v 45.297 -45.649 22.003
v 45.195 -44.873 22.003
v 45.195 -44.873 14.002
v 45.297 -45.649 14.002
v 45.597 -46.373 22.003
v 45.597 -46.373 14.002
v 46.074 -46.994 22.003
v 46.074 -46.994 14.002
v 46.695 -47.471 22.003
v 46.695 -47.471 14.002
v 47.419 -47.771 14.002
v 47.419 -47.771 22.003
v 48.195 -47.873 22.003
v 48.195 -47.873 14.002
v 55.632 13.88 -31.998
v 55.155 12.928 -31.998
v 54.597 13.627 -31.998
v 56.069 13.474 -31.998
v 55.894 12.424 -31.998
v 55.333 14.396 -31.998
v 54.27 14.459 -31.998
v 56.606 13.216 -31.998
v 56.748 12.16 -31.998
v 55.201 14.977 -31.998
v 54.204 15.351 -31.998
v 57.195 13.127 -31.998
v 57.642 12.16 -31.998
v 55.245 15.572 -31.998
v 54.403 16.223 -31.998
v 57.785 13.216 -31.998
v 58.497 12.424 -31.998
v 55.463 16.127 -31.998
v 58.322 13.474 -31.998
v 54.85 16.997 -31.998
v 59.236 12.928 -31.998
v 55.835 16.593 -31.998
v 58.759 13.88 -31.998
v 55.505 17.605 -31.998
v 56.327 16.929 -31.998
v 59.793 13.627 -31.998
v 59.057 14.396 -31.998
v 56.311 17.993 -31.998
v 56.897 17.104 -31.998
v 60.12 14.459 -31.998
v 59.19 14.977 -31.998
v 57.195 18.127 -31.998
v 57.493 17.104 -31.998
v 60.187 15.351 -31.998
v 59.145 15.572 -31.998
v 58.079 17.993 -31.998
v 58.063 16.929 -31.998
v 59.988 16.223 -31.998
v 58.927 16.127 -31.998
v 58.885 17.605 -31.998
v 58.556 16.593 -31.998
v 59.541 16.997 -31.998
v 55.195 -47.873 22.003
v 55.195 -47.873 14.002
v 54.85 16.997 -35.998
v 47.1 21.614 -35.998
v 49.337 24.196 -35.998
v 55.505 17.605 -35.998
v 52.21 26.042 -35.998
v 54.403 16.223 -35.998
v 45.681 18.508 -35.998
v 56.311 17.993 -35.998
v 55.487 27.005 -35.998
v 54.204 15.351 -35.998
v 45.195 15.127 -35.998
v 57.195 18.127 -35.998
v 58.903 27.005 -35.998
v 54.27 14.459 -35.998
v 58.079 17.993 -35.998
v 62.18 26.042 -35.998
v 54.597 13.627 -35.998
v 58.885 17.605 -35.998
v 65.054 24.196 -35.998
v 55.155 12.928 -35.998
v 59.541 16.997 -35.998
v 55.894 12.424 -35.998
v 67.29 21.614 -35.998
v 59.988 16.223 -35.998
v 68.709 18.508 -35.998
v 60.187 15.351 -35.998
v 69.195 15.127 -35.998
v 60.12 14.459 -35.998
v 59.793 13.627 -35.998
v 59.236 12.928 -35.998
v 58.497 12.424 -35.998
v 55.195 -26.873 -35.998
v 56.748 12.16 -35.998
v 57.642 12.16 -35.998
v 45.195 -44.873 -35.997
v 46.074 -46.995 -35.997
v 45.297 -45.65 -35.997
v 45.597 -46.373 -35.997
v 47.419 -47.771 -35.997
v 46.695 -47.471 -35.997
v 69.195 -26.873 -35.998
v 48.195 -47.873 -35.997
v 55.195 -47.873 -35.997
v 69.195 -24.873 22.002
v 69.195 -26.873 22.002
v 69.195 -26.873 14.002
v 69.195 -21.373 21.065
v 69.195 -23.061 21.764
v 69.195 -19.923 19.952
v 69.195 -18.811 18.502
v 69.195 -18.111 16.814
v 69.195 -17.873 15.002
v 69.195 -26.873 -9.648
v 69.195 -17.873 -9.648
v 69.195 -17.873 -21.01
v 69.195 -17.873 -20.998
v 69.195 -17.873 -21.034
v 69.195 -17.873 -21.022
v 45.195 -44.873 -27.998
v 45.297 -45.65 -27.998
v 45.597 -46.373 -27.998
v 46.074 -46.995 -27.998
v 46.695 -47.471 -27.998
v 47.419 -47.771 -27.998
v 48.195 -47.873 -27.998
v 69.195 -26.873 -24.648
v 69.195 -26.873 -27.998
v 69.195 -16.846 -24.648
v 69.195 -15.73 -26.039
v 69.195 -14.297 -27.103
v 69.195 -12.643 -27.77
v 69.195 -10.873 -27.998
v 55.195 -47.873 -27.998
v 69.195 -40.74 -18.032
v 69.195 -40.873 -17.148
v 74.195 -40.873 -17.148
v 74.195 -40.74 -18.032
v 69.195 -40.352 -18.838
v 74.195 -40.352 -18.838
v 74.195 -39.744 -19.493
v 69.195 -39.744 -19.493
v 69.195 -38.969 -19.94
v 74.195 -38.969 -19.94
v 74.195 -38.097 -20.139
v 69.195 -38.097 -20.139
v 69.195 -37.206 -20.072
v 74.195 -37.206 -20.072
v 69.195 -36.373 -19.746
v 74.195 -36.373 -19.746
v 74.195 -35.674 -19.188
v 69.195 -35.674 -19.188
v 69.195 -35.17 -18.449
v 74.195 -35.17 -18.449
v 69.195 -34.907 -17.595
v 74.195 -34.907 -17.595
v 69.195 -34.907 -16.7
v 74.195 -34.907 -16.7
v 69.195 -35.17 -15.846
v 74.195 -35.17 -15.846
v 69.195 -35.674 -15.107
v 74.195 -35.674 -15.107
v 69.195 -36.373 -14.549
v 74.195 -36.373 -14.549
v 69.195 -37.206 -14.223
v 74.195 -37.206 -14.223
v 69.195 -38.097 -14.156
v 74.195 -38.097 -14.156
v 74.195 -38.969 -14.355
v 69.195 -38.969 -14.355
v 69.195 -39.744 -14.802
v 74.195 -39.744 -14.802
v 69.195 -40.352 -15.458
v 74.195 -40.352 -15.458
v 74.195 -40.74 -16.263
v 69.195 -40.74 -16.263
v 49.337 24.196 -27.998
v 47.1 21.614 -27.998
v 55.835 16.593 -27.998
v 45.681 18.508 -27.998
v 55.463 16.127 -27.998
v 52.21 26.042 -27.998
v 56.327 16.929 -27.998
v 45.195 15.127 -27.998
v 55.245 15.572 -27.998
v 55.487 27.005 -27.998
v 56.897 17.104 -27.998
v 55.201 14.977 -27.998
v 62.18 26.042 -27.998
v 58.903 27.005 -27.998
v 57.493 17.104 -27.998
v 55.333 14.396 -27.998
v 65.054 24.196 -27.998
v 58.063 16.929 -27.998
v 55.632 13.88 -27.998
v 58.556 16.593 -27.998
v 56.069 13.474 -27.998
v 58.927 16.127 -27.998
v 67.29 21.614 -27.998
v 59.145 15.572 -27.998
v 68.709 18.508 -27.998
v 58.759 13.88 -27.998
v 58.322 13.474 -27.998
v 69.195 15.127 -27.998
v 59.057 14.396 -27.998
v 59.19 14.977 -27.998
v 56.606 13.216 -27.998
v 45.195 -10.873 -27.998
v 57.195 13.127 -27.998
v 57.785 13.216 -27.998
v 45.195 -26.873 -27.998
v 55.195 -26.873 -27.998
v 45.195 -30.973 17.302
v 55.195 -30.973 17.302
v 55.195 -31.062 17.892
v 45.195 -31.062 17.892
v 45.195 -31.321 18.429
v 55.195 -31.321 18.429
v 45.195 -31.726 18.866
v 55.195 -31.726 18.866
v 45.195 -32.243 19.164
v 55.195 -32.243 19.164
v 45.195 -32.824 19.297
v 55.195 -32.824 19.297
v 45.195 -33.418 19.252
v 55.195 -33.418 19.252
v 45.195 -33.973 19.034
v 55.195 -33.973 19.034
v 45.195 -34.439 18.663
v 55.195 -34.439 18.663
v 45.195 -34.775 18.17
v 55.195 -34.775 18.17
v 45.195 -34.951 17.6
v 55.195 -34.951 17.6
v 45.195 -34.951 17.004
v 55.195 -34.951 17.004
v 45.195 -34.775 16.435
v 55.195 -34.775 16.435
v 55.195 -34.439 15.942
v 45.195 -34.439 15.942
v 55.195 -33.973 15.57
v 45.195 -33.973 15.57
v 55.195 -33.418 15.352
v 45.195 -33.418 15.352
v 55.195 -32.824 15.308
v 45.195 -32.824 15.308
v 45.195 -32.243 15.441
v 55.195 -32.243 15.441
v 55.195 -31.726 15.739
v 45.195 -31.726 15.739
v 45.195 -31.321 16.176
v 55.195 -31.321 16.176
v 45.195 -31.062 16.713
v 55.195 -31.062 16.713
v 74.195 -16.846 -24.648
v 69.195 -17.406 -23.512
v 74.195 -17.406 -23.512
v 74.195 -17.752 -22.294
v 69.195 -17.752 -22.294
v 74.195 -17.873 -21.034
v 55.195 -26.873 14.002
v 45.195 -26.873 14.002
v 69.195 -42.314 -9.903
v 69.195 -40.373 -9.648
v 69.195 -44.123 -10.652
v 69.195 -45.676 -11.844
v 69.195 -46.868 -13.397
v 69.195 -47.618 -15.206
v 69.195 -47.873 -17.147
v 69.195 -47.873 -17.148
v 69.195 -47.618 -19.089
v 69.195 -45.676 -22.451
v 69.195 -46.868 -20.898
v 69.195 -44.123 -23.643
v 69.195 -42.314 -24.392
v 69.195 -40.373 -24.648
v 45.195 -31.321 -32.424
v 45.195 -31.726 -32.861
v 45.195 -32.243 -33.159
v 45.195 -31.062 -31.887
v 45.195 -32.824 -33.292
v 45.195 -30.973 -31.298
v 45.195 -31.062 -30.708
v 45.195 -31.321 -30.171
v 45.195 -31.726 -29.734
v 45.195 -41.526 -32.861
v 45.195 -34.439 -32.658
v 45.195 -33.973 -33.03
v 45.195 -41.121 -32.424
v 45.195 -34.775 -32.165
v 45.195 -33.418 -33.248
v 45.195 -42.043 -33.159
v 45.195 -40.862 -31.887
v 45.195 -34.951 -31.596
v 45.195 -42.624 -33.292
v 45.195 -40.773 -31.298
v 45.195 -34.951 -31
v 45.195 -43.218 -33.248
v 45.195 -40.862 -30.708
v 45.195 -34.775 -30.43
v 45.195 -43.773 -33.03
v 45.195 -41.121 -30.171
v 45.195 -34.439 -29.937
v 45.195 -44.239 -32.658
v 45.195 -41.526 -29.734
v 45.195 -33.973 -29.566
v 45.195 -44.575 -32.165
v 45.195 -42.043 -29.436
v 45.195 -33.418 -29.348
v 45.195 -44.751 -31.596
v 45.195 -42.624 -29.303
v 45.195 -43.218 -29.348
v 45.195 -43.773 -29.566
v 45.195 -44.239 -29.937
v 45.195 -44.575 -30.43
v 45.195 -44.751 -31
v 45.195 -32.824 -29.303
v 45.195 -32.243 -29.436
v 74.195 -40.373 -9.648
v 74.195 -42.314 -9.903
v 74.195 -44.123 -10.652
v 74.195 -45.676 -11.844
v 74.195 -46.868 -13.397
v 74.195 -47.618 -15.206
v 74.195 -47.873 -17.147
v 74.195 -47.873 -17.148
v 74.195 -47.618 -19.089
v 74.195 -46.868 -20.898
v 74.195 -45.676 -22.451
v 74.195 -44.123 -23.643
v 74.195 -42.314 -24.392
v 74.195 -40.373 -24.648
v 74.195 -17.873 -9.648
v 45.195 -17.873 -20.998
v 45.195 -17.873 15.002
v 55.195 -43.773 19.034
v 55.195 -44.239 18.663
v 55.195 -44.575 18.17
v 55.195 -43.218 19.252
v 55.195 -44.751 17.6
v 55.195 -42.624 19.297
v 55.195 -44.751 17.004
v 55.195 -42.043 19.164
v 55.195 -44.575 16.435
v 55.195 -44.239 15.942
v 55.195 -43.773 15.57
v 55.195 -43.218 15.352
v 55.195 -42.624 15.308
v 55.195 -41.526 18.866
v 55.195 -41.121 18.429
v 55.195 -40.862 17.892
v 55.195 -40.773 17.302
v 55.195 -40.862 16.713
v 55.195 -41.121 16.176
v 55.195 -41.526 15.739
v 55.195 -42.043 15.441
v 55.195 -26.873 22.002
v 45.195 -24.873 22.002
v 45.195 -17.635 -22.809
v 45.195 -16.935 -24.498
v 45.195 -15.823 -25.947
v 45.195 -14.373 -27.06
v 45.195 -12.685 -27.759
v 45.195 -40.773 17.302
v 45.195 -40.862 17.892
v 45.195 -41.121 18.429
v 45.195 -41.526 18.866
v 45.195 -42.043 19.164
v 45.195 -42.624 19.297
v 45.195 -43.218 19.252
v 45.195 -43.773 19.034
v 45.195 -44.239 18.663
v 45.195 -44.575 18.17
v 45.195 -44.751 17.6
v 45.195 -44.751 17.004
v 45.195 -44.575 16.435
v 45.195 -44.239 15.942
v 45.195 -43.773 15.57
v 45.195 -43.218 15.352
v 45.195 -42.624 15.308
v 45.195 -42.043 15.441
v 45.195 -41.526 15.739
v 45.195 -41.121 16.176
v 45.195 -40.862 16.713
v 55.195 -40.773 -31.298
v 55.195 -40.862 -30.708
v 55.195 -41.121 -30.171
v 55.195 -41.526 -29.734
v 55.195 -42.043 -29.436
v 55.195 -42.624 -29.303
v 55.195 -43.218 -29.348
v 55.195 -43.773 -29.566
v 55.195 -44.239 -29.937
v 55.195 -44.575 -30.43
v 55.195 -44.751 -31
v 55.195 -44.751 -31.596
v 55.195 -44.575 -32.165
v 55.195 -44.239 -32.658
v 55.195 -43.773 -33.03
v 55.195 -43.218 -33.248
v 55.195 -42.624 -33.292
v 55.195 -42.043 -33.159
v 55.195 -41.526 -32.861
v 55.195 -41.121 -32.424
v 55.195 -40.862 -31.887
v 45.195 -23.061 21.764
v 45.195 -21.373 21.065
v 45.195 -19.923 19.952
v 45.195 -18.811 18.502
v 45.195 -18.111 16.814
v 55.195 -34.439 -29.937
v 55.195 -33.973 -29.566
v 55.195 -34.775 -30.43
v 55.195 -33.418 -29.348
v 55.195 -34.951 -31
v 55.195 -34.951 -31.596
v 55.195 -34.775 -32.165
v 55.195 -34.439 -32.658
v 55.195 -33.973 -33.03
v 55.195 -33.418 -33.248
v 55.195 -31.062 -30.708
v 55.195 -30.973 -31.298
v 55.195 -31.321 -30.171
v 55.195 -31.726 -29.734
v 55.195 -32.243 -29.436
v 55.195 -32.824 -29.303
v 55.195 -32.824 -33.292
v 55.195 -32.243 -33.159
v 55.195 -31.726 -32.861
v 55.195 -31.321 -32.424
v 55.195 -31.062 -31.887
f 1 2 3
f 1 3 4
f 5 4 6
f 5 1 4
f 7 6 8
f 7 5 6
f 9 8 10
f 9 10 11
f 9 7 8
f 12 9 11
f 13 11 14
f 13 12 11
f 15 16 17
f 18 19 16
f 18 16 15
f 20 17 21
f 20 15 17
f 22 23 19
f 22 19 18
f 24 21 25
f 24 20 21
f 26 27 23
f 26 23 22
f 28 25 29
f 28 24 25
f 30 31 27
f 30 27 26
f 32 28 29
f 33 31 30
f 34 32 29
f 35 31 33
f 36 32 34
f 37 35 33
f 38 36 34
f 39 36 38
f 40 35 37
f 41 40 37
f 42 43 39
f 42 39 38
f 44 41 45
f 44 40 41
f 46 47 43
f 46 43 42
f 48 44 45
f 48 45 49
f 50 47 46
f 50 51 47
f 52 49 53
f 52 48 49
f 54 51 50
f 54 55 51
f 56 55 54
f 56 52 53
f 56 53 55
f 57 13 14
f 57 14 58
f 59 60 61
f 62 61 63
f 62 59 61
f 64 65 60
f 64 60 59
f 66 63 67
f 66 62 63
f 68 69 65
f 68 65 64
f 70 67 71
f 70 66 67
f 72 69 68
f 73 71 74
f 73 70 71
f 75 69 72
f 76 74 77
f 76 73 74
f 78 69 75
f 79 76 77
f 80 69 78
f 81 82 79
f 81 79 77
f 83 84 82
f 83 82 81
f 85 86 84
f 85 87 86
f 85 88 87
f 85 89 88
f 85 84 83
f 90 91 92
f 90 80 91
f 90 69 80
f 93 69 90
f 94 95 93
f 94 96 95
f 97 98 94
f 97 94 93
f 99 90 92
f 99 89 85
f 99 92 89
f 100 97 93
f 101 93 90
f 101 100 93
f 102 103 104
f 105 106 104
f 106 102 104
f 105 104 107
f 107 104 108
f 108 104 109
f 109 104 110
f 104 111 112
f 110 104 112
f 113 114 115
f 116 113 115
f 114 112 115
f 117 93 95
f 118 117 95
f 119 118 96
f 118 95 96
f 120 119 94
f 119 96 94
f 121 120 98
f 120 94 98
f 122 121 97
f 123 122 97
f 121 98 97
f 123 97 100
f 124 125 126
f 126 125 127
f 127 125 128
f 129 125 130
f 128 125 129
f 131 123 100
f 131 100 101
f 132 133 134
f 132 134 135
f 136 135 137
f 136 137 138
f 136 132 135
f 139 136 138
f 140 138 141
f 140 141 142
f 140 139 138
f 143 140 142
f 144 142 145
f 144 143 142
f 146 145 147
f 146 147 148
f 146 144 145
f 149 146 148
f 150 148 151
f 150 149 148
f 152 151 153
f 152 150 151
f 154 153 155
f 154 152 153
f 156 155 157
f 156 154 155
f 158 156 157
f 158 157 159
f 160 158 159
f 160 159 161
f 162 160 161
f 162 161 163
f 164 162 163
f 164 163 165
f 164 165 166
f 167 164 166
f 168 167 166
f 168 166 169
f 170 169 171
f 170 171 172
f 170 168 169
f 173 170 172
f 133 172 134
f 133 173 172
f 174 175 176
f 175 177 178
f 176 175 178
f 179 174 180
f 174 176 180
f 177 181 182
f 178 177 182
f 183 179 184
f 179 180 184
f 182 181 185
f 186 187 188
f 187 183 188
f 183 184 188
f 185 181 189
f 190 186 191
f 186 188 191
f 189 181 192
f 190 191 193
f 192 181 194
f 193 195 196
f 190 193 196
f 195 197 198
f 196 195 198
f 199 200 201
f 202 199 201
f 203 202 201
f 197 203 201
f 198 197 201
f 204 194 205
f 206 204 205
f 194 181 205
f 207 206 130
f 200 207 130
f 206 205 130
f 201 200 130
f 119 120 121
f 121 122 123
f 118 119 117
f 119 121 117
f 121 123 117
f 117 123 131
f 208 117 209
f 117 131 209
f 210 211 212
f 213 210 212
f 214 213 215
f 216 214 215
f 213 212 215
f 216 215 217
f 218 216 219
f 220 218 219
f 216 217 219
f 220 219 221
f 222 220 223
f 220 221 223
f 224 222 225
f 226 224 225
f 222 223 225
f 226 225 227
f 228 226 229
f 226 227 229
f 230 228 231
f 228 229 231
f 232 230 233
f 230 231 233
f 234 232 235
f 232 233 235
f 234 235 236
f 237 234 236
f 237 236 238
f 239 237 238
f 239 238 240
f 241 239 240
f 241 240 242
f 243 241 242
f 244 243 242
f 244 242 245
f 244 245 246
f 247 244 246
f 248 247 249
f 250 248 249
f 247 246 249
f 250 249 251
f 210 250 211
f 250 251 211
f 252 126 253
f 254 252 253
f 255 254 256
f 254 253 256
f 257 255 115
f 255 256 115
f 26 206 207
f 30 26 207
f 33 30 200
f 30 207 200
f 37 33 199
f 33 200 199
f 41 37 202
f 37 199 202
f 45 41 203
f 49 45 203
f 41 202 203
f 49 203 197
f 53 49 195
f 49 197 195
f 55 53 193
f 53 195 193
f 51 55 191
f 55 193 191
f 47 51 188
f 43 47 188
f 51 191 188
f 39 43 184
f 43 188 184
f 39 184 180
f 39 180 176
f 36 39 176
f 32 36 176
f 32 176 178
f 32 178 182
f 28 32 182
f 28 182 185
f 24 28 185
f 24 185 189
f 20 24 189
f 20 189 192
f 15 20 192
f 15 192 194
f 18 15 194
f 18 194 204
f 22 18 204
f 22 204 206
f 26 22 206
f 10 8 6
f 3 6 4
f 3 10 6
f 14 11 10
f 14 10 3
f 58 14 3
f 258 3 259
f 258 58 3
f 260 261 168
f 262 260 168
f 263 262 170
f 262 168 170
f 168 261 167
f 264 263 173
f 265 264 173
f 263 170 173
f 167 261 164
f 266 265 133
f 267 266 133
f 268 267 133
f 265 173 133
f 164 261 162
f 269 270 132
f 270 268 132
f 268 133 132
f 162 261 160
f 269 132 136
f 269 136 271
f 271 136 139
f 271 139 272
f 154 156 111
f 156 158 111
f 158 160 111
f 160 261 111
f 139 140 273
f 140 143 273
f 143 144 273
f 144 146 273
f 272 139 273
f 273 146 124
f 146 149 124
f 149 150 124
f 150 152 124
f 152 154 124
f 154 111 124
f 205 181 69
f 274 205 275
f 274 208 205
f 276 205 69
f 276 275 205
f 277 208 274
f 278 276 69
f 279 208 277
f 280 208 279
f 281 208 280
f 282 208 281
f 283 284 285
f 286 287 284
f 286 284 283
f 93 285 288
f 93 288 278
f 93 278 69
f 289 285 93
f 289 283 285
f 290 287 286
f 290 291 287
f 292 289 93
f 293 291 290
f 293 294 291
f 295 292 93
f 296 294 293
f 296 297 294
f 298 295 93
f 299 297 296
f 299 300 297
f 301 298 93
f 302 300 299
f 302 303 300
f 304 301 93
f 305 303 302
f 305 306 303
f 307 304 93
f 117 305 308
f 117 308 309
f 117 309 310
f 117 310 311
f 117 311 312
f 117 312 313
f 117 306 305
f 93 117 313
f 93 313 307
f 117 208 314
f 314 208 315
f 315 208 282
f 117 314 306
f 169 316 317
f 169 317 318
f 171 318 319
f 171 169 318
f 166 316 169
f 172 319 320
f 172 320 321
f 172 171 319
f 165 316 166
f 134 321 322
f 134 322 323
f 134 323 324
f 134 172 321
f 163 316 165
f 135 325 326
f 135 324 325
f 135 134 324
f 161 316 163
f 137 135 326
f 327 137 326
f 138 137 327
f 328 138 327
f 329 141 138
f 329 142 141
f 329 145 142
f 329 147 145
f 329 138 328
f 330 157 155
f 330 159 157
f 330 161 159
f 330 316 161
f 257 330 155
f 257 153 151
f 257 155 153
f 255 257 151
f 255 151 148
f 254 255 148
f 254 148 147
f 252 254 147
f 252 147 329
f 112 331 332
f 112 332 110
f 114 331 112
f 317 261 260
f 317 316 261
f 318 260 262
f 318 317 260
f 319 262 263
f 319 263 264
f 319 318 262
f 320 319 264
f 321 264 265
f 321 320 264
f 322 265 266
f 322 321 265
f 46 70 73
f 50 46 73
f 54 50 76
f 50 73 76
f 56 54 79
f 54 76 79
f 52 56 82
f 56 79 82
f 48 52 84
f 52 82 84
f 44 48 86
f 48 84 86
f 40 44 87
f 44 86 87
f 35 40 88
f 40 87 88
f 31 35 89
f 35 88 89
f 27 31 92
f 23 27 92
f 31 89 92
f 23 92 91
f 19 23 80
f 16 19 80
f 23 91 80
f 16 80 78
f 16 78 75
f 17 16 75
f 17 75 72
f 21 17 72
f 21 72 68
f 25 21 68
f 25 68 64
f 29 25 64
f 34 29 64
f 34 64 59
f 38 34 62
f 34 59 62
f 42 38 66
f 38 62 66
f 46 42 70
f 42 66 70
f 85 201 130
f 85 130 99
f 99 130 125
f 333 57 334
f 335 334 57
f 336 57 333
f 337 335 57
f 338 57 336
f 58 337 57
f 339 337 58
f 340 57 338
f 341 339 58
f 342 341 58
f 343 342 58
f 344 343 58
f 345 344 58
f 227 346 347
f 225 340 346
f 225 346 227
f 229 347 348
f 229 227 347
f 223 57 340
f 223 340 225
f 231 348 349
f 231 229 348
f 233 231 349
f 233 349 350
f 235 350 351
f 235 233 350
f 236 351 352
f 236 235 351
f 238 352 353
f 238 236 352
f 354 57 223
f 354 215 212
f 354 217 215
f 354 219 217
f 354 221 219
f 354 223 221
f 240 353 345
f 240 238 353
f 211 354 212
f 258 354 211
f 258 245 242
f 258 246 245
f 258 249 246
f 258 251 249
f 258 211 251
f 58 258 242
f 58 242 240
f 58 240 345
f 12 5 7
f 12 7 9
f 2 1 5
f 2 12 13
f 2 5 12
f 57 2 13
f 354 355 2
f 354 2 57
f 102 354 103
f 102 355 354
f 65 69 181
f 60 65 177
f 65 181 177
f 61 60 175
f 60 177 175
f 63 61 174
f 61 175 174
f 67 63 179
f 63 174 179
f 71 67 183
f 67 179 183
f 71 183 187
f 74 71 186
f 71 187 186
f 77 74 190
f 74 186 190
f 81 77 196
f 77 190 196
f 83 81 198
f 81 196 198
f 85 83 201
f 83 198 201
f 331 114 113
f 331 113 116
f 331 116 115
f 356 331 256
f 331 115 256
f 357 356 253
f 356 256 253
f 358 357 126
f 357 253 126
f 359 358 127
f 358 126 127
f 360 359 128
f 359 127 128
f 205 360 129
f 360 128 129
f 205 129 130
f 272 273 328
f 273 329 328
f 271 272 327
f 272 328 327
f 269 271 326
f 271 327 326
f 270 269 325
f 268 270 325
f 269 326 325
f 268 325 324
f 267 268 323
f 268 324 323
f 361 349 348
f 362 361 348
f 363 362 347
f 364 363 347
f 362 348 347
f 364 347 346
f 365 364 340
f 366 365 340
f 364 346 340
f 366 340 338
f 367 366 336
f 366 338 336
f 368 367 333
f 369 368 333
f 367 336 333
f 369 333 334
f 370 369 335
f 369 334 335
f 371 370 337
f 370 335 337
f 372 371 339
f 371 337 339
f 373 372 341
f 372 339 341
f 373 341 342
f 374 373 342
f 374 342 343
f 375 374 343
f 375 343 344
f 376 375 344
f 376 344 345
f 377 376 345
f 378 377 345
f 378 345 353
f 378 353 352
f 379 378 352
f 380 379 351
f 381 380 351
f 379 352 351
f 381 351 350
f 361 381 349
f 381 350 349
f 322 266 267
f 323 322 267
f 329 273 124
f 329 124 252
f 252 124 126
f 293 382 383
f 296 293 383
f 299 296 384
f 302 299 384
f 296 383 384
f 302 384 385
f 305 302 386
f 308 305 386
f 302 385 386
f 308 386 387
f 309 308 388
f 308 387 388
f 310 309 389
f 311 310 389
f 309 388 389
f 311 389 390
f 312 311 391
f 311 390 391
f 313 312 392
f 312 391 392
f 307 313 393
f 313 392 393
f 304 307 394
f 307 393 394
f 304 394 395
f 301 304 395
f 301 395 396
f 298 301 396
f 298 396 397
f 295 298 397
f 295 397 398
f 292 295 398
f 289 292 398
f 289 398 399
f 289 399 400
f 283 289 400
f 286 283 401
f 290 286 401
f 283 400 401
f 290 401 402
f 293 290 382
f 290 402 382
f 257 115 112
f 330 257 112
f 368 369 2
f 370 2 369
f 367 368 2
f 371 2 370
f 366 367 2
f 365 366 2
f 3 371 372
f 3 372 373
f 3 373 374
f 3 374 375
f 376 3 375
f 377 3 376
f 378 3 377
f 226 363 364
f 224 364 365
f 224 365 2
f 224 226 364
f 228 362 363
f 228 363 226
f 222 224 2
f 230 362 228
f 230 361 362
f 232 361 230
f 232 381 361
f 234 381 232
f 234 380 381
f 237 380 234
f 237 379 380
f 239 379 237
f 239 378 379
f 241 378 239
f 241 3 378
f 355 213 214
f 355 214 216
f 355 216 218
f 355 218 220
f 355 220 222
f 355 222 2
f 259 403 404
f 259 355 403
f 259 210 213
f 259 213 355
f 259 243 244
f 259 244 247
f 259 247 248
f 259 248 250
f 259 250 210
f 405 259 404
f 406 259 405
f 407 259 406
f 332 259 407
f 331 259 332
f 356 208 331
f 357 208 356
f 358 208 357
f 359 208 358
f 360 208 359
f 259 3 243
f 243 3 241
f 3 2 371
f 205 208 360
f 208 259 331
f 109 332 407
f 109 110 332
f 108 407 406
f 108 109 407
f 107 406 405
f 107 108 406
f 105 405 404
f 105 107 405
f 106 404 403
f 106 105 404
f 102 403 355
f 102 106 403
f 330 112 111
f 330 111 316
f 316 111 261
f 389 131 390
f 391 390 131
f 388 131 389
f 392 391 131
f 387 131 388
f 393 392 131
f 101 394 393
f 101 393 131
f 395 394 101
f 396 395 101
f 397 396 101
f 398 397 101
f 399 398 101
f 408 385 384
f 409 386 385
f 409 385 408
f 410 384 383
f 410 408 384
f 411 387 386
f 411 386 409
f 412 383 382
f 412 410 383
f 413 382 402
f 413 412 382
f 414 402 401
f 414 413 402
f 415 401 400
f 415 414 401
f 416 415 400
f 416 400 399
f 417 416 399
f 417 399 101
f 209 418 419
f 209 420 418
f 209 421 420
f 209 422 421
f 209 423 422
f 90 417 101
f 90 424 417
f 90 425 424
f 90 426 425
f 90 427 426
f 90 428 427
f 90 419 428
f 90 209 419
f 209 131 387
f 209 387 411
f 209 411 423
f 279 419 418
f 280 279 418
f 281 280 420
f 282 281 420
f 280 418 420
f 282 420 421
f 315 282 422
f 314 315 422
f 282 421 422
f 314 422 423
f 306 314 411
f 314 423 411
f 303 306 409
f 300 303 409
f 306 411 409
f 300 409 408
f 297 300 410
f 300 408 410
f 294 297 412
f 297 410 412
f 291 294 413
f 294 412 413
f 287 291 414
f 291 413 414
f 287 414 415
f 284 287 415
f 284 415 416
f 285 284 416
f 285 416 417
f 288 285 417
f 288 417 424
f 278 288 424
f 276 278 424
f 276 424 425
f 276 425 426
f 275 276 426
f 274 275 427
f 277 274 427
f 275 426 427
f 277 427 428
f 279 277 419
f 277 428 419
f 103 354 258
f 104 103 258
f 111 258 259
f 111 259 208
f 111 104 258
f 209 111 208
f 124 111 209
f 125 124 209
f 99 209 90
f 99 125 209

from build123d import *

# Parameters (mm, degrees)
SKETCH2_W           = 24
SKETCH2_H           = 75
BOSS_EXTRUDE1_DEPTH = 8
FILLET1_R           = 12
SKETCH3_W           = 24.000000014
SKETCH3_H           = 30
BOSS_EXTRUDE2_DEPTH = 50
SKETCH4_W           = 42
SKETCH4_H           = 27.227537437
CUT_EXTRUDE1_DEPTH  = 24
FILLET2_R           = 7
CUT_EXTRUDE3_DEPTH  = 14
SKETCH6_R           = 3
BOSS_EXTRUDE3_DEPTH = 5
FILLET3_R           = 3
SKETCH7_R           = 2
CUT_EXTRUDE4_DEPTH  = 102.473144681
SKETCH8_R           = 3
CUT_EXTRUDE5_DEPTH  = 4
SKETCH9_R           = 2
CUT_EXTRUDE6_DEPTH  = 10
FILLET4_R           = 7.5


# Some blends are built 0.0001 mm under size
with BuildPart() as part:
    # Sketch2 → Boss-Extrude1 (new body)
    with BuildSketch(Plane(origin=(0, -0.00023232, -27.997849314), x_dir=(1.0, -2.2299085471311813e-10, 0), z_dir=(-1.0101845712424022e-15, -8.29778911543011e-06, -0.9999999999655734))):
        with Locations((57.195219243, 10.372982491)):
            Rectangle(SKETCH2_W, SKETCH2_H)
    extrude(amount=BOSS_EXTRUDE1_DEPTH)

    # Fillet1
    # the kernel refuses this fillet: 12 mm, written as the material it takes off along each edge
    with BuildSketch(Plane(origin=(45.195219249, 27.127034112, 2.001925591), x_dir=(1.0, -2.229911070638136e-10, 0), z_dir=(-1.0101845712424022e-15, -8.29778911543011e-06, -0.9999999999655734))) as fillet1_piece_1:
        with BuildLine():
            CenterArc((FILLET1_R, FILLET1_R), FILLET1_R, 180, 90)
            Line((0, FILLET1_R), (0, 0))
            Line((0, 0), (FILLET1_R, 0))
        make_face()
    extrude(amount=68, mode=Mode.SUBTRACT)
    with BuildSketch(Plane(origin=(69.195219249, 27.127034106, 2.001925591), x_dir=(-1.0, 2.229905149399539e-10, 0), z_dir=(-1.0101845712424022e-15, -8.29778911543011e-06, -0.9999999999655734))) as fillet1_piece_2:
        with BuildLine():
            CenterArc((FILLET1_R, -FILLET1_R), FILLET1_R, 90, 90)
            Line((0, -FILLET1_R), (0, 0))
            Line((0, 0), (FILLET1_R, 0))
        make_face()
    extrude(amount=68, mode=Mode.SUBTRACT)

    # Sketch3 → Boss-Extrude2 (add)
    with BuildSketch(Plane(origin=(0, -0.00023232, -27.997849314), x_dir=(1, 0, 0), z_dir=(0, 8.297789115425485e-06, 0.9999999999655734))):
        with Locations((57.19521924, -32.872982501)):
            Rectangle(SKETCH3_W, SKETCH3_H)
    extrude(amount=BOSS_EXTRUDE2_DEPTH)

    # Sketch4 → Cut-Extrude1 (cut)
    with BuildSketch(Plane(origin=(69.195219243, -1.5e-08, 0), x_dir=(0, 0, -1), z_dir=(1.0, -2.2299088501705893e-10, 0))):
        with Locations((6.99770101, -40.486956155)):
            Rectangle(SKETCH4_W, SKETCH4_H)
    extrude(amount=-CUT_EXTRUDE1_DEPTH, mode=Mode.SUBTRACT)

    # Fillet2
    fillet2_edges = [part.edges().sort_by_distance(p)[0] for p in [
        (57.19521924, -17.87321482, -27.997701008),
        (57.19521924, -17.872799931, 22.002298991),
    ]]
    fillet(fillet2_edges, radius=FILLET2_R)

    # Sketch5 → Cut-Extrude3 (cut)
    with BuildSketch(Plane(origin=(69.195219243, -1.5e-08, 0), x_dir=(0, 0, -1), z_dir=(1.0, -2.2299088501705893e-10, 0))):
        Polygon((-22.002373674, -26.873187436), (-22.002547924, -47.872799915), (35.997452074, -47.873281192), (35.997626328, -26.873187436), align=None)
    extrude(amount=-CUT_EXTRUDE3_DEPTH, mode=Mode.SUBTRACT)

    # Sketch6 → Boss-Extrude3 (add)
    with BuildSketch(Plane(origin=(69.195219243, -1.5e-08, 0), x_dir=(0, 0, -1), z_dir=(1.0, -2.2299088501705893e-10, 0))):
        with BuildLine():
            Line((21.034070668, -17.873062539), (9.647551643, -17.873062539))
            Line((9.647551643, -17.873062539), (9.647551643, -47.873062539))
            Line((9.647551643, -47.873062539), (24.647551644, -47.873187436))
            Line((24.647551644, -47.873187436), (24.647551644, -16.846348023))
            ThreePointArc((24.647551644, -16.846348023), (22.910970159, -17.606627105), (21.034070668, -17.873062539))
        make_face()
        with Locations(Location((17.147551644, -37.873187436, 0), (0, 0, 270))):
            Circle(SKETCH6_R, mode=Mode.SUBTRACT)
    extrude(amount=BOSS_EXTRUDE3_DEPTH)

    # Fillet3
    fillet3_edges = [part.edges().sort_by_distance(p)[0] for p in [
        (45.195219233, -47.872833122, 18.002423457),
        (45.195219233, -47.873248012, -31.997576542),
    ]]
    fillet(fillet3_edges, radius=FILLET3_R)

    # Sketch7 → Cut-Extrude4 (cut, through all)
    with BuildSketch(Plane(origin=(0, -0.00023232, -27.997849314), x_dir=(1, 0, 0), z_dir=(0, 8.297789115402354e-06, 0.9999999999655734))):
        with Locations(Location((57.195219247, 15.127017497, 0), (0, 0, 270))):
            Circle(SKETCH7_R)
    extrude(amount=-CUT_EXTRUDE4_DEPTH, mode=Mode.SUBTRACT)

    # Sketch8 → Cut-Extrude5 (cut)
    with BuildSketch(Plane(origin=(0, -0.000298703, -35.997849314), x_dir=(-1, 0, 0), z_dir=(0, -8.297789115402354e-06, -0.9999999999655734))):
        with Locations(Location((-57.195219247, 15.127017497, 0), (0, 0, 90))):
            Circle(SKETCH8_R)
    extrude(amount=-CUT_EXTRUDE5_DEPTH, mode=Mode.SUBTRACT)

    # Sketch9 → Cut-Extrude6 (cut)
    with BuildSketch(Plane(origin=(55.195219243, -1.2e-08, 0), x_dir=(0, 0, -1), z_dir=(1.0, -2.2299126401379802e-10, 0))):
        with Locations(Location((31.29770101, -42.773187436, 0), (0, 0, 90))):
            Circle(SKETCH9_R)
        with Locations(Location((31.29770101, -32.973187436, 0), (0, 0, 90))):
            Circle(SKETCH9_R)
        with Locations(Location((-17.30229899, -42.773187436, 0), (0, 0, 90))):
            Circle(SKETCH9_R)
        with Locations(Location((-17.30229899, -32.973187436, 0), (0, 0, 90))):
            Circle(SKETCH9_R)
    extrude(amount=-CUT_EXTRUDE6_DEPTH, mode=Mode.SUBTRACT)

    # Fillet4
    fillet4_edges = [part.edges().sort_by_distance(p)[0] for p in [
        (71.695219233, -47.873187452, -24.647551644),
        (71.695219233, -47.873062555, -9.647551643),
    ]]
    fillet(fillet4_edges, radius=FILLET4_R - 0.0001)  # a hair under: the kernel refuses the full size


solid = part.part
